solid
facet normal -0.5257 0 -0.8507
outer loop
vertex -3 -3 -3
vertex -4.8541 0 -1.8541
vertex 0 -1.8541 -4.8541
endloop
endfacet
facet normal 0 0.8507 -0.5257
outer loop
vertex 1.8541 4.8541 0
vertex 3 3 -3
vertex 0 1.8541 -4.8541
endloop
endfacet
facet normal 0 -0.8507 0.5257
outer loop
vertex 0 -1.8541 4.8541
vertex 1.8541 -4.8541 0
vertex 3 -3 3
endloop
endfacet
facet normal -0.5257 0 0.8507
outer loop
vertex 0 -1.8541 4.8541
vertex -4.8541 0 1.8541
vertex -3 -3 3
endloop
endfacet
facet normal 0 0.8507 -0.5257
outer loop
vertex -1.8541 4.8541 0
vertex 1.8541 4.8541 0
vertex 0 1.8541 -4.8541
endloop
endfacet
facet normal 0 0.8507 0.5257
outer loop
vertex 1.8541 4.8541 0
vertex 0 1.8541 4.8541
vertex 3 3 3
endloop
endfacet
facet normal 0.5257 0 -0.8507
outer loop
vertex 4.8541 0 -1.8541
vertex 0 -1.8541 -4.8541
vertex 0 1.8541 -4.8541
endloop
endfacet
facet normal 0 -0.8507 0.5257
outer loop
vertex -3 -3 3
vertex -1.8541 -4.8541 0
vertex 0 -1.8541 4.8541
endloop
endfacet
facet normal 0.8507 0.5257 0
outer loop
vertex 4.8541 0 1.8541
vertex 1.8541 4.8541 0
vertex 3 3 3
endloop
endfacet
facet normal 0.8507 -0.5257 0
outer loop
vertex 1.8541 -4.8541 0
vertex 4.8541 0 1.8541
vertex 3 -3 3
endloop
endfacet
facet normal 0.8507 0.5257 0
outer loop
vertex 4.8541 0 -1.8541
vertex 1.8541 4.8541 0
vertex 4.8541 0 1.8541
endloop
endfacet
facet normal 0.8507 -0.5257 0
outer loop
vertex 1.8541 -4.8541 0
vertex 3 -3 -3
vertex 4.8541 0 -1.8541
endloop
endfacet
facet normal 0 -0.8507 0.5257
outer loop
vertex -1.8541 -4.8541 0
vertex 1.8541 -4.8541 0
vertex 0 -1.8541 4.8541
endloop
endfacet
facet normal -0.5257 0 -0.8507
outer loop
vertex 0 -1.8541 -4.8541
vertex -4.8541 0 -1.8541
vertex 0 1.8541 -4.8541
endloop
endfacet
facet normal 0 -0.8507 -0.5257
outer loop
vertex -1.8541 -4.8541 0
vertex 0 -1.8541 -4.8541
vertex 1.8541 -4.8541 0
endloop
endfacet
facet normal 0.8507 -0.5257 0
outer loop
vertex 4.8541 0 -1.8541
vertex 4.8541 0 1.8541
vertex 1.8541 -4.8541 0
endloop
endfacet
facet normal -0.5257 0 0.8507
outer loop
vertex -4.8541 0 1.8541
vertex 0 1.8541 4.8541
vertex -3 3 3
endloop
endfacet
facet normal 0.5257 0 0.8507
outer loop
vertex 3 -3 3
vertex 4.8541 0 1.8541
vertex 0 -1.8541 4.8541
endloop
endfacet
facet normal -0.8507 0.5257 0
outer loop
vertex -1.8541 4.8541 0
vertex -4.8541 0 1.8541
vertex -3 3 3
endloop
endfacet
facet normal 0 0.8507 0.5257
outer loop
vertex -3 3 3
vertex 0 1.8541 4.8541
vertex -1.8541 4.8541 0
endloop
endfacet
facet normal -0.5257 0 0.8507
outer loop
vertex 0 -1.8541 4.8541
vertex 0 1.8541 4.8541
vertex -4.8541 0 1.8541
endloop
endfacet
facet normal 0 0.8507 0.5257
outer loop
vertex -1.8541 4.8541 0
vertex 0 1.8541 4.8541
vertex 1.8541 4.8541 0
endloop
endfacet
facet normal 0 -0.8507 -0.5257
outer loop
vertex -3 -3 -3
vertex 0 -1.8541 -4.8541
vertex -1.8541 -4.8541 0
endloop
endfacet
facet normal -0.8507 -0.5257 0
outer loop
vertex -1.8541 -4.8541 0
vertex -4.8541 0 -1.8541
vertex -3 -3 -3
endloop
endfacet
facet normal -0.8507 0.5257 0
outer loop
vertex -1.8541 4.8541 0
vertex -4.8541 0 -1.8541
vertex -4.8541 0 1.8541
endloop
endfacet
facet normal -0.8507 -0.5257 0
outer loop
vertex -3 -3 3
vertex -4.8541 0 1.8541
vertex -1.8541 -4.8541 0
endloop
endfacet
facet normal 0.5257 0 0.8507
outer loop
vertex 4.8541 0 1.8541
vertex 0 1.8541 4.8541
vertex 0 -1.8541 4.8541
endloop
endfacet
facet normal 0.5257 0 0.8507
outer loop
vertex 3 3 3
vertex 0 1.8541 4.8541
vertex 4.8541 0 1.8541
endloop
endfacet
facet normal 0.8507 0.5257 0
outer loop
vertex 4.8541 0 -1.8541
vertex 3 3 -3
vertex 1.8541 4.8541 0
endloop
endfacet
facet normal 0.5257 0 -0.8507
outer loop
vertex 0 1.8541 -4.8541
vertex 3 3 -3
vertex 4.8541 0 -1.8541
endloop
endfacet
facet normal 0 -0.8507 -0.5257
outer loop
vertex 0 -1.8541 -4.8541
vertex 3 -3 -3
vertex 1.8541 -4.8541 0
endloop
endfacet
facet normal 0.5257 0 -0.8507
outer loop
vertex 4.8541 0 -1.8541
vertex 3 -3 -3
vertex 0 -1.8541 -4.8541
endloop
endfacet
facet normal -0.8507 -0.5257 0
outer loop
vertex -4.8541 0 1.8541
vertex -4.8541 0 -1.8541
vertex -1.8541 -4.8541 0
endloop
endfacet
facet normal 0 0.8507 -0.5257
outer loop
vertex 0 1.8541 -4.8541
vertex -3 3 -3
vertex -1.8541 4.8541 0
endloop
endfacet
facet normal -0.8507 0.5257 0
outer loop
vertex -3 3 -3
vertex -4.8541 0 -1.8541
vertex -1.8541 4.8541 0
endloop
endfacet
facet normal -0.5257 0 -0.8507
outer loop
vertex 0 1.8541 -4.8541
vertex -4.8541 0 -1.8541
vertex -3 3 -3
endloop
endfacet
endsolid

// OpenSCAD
module dodecahedron (x) {
    phi = (1 + (sqrt (5)))/2;
    term_one = 1 / phi;
    term_two = phi;

    cube_points = [
	[1, 1, 1],
	[-1, 1, 1],
	[1, -1, 1],
	[-1, -1, 1],
	[1, 1, -1],
	[-1, 1, -1],
	[1, -1, -1,],
	[-1, -1, -1]
    ];

    noncube_points = [
	[0, term_one, term_two],
	[0, -term_one, (term_two)],
	[0, term_one, -(term_two)],
	[0, -term_one, -(term_two)],

	[term_one, (term_two), 0],
	[-term_one, (term_two), 0],
	[term_one, -(term_two), 0],
	[-term_one, -(term_two), 0],

	[term_two, 0, (term_one)],
	[-term_two, 0, (term_one)],
	[term_two, 0, -(term_one)],
	[-term_two, 0, -(term_one)],
    ];
    
    scale ([x, x, x]) {
union () {
	hull () {
	    cube (size=2, center=true);
	    polyhedron (
		points = noncube_points,
		faces = [
		    [0, 1, 2],
		    [3, 4, 5],
		    [6, 7, 8],
		    [9, 10, 11]
		]);
	}
    }
}
}

dodecahedron (3);
